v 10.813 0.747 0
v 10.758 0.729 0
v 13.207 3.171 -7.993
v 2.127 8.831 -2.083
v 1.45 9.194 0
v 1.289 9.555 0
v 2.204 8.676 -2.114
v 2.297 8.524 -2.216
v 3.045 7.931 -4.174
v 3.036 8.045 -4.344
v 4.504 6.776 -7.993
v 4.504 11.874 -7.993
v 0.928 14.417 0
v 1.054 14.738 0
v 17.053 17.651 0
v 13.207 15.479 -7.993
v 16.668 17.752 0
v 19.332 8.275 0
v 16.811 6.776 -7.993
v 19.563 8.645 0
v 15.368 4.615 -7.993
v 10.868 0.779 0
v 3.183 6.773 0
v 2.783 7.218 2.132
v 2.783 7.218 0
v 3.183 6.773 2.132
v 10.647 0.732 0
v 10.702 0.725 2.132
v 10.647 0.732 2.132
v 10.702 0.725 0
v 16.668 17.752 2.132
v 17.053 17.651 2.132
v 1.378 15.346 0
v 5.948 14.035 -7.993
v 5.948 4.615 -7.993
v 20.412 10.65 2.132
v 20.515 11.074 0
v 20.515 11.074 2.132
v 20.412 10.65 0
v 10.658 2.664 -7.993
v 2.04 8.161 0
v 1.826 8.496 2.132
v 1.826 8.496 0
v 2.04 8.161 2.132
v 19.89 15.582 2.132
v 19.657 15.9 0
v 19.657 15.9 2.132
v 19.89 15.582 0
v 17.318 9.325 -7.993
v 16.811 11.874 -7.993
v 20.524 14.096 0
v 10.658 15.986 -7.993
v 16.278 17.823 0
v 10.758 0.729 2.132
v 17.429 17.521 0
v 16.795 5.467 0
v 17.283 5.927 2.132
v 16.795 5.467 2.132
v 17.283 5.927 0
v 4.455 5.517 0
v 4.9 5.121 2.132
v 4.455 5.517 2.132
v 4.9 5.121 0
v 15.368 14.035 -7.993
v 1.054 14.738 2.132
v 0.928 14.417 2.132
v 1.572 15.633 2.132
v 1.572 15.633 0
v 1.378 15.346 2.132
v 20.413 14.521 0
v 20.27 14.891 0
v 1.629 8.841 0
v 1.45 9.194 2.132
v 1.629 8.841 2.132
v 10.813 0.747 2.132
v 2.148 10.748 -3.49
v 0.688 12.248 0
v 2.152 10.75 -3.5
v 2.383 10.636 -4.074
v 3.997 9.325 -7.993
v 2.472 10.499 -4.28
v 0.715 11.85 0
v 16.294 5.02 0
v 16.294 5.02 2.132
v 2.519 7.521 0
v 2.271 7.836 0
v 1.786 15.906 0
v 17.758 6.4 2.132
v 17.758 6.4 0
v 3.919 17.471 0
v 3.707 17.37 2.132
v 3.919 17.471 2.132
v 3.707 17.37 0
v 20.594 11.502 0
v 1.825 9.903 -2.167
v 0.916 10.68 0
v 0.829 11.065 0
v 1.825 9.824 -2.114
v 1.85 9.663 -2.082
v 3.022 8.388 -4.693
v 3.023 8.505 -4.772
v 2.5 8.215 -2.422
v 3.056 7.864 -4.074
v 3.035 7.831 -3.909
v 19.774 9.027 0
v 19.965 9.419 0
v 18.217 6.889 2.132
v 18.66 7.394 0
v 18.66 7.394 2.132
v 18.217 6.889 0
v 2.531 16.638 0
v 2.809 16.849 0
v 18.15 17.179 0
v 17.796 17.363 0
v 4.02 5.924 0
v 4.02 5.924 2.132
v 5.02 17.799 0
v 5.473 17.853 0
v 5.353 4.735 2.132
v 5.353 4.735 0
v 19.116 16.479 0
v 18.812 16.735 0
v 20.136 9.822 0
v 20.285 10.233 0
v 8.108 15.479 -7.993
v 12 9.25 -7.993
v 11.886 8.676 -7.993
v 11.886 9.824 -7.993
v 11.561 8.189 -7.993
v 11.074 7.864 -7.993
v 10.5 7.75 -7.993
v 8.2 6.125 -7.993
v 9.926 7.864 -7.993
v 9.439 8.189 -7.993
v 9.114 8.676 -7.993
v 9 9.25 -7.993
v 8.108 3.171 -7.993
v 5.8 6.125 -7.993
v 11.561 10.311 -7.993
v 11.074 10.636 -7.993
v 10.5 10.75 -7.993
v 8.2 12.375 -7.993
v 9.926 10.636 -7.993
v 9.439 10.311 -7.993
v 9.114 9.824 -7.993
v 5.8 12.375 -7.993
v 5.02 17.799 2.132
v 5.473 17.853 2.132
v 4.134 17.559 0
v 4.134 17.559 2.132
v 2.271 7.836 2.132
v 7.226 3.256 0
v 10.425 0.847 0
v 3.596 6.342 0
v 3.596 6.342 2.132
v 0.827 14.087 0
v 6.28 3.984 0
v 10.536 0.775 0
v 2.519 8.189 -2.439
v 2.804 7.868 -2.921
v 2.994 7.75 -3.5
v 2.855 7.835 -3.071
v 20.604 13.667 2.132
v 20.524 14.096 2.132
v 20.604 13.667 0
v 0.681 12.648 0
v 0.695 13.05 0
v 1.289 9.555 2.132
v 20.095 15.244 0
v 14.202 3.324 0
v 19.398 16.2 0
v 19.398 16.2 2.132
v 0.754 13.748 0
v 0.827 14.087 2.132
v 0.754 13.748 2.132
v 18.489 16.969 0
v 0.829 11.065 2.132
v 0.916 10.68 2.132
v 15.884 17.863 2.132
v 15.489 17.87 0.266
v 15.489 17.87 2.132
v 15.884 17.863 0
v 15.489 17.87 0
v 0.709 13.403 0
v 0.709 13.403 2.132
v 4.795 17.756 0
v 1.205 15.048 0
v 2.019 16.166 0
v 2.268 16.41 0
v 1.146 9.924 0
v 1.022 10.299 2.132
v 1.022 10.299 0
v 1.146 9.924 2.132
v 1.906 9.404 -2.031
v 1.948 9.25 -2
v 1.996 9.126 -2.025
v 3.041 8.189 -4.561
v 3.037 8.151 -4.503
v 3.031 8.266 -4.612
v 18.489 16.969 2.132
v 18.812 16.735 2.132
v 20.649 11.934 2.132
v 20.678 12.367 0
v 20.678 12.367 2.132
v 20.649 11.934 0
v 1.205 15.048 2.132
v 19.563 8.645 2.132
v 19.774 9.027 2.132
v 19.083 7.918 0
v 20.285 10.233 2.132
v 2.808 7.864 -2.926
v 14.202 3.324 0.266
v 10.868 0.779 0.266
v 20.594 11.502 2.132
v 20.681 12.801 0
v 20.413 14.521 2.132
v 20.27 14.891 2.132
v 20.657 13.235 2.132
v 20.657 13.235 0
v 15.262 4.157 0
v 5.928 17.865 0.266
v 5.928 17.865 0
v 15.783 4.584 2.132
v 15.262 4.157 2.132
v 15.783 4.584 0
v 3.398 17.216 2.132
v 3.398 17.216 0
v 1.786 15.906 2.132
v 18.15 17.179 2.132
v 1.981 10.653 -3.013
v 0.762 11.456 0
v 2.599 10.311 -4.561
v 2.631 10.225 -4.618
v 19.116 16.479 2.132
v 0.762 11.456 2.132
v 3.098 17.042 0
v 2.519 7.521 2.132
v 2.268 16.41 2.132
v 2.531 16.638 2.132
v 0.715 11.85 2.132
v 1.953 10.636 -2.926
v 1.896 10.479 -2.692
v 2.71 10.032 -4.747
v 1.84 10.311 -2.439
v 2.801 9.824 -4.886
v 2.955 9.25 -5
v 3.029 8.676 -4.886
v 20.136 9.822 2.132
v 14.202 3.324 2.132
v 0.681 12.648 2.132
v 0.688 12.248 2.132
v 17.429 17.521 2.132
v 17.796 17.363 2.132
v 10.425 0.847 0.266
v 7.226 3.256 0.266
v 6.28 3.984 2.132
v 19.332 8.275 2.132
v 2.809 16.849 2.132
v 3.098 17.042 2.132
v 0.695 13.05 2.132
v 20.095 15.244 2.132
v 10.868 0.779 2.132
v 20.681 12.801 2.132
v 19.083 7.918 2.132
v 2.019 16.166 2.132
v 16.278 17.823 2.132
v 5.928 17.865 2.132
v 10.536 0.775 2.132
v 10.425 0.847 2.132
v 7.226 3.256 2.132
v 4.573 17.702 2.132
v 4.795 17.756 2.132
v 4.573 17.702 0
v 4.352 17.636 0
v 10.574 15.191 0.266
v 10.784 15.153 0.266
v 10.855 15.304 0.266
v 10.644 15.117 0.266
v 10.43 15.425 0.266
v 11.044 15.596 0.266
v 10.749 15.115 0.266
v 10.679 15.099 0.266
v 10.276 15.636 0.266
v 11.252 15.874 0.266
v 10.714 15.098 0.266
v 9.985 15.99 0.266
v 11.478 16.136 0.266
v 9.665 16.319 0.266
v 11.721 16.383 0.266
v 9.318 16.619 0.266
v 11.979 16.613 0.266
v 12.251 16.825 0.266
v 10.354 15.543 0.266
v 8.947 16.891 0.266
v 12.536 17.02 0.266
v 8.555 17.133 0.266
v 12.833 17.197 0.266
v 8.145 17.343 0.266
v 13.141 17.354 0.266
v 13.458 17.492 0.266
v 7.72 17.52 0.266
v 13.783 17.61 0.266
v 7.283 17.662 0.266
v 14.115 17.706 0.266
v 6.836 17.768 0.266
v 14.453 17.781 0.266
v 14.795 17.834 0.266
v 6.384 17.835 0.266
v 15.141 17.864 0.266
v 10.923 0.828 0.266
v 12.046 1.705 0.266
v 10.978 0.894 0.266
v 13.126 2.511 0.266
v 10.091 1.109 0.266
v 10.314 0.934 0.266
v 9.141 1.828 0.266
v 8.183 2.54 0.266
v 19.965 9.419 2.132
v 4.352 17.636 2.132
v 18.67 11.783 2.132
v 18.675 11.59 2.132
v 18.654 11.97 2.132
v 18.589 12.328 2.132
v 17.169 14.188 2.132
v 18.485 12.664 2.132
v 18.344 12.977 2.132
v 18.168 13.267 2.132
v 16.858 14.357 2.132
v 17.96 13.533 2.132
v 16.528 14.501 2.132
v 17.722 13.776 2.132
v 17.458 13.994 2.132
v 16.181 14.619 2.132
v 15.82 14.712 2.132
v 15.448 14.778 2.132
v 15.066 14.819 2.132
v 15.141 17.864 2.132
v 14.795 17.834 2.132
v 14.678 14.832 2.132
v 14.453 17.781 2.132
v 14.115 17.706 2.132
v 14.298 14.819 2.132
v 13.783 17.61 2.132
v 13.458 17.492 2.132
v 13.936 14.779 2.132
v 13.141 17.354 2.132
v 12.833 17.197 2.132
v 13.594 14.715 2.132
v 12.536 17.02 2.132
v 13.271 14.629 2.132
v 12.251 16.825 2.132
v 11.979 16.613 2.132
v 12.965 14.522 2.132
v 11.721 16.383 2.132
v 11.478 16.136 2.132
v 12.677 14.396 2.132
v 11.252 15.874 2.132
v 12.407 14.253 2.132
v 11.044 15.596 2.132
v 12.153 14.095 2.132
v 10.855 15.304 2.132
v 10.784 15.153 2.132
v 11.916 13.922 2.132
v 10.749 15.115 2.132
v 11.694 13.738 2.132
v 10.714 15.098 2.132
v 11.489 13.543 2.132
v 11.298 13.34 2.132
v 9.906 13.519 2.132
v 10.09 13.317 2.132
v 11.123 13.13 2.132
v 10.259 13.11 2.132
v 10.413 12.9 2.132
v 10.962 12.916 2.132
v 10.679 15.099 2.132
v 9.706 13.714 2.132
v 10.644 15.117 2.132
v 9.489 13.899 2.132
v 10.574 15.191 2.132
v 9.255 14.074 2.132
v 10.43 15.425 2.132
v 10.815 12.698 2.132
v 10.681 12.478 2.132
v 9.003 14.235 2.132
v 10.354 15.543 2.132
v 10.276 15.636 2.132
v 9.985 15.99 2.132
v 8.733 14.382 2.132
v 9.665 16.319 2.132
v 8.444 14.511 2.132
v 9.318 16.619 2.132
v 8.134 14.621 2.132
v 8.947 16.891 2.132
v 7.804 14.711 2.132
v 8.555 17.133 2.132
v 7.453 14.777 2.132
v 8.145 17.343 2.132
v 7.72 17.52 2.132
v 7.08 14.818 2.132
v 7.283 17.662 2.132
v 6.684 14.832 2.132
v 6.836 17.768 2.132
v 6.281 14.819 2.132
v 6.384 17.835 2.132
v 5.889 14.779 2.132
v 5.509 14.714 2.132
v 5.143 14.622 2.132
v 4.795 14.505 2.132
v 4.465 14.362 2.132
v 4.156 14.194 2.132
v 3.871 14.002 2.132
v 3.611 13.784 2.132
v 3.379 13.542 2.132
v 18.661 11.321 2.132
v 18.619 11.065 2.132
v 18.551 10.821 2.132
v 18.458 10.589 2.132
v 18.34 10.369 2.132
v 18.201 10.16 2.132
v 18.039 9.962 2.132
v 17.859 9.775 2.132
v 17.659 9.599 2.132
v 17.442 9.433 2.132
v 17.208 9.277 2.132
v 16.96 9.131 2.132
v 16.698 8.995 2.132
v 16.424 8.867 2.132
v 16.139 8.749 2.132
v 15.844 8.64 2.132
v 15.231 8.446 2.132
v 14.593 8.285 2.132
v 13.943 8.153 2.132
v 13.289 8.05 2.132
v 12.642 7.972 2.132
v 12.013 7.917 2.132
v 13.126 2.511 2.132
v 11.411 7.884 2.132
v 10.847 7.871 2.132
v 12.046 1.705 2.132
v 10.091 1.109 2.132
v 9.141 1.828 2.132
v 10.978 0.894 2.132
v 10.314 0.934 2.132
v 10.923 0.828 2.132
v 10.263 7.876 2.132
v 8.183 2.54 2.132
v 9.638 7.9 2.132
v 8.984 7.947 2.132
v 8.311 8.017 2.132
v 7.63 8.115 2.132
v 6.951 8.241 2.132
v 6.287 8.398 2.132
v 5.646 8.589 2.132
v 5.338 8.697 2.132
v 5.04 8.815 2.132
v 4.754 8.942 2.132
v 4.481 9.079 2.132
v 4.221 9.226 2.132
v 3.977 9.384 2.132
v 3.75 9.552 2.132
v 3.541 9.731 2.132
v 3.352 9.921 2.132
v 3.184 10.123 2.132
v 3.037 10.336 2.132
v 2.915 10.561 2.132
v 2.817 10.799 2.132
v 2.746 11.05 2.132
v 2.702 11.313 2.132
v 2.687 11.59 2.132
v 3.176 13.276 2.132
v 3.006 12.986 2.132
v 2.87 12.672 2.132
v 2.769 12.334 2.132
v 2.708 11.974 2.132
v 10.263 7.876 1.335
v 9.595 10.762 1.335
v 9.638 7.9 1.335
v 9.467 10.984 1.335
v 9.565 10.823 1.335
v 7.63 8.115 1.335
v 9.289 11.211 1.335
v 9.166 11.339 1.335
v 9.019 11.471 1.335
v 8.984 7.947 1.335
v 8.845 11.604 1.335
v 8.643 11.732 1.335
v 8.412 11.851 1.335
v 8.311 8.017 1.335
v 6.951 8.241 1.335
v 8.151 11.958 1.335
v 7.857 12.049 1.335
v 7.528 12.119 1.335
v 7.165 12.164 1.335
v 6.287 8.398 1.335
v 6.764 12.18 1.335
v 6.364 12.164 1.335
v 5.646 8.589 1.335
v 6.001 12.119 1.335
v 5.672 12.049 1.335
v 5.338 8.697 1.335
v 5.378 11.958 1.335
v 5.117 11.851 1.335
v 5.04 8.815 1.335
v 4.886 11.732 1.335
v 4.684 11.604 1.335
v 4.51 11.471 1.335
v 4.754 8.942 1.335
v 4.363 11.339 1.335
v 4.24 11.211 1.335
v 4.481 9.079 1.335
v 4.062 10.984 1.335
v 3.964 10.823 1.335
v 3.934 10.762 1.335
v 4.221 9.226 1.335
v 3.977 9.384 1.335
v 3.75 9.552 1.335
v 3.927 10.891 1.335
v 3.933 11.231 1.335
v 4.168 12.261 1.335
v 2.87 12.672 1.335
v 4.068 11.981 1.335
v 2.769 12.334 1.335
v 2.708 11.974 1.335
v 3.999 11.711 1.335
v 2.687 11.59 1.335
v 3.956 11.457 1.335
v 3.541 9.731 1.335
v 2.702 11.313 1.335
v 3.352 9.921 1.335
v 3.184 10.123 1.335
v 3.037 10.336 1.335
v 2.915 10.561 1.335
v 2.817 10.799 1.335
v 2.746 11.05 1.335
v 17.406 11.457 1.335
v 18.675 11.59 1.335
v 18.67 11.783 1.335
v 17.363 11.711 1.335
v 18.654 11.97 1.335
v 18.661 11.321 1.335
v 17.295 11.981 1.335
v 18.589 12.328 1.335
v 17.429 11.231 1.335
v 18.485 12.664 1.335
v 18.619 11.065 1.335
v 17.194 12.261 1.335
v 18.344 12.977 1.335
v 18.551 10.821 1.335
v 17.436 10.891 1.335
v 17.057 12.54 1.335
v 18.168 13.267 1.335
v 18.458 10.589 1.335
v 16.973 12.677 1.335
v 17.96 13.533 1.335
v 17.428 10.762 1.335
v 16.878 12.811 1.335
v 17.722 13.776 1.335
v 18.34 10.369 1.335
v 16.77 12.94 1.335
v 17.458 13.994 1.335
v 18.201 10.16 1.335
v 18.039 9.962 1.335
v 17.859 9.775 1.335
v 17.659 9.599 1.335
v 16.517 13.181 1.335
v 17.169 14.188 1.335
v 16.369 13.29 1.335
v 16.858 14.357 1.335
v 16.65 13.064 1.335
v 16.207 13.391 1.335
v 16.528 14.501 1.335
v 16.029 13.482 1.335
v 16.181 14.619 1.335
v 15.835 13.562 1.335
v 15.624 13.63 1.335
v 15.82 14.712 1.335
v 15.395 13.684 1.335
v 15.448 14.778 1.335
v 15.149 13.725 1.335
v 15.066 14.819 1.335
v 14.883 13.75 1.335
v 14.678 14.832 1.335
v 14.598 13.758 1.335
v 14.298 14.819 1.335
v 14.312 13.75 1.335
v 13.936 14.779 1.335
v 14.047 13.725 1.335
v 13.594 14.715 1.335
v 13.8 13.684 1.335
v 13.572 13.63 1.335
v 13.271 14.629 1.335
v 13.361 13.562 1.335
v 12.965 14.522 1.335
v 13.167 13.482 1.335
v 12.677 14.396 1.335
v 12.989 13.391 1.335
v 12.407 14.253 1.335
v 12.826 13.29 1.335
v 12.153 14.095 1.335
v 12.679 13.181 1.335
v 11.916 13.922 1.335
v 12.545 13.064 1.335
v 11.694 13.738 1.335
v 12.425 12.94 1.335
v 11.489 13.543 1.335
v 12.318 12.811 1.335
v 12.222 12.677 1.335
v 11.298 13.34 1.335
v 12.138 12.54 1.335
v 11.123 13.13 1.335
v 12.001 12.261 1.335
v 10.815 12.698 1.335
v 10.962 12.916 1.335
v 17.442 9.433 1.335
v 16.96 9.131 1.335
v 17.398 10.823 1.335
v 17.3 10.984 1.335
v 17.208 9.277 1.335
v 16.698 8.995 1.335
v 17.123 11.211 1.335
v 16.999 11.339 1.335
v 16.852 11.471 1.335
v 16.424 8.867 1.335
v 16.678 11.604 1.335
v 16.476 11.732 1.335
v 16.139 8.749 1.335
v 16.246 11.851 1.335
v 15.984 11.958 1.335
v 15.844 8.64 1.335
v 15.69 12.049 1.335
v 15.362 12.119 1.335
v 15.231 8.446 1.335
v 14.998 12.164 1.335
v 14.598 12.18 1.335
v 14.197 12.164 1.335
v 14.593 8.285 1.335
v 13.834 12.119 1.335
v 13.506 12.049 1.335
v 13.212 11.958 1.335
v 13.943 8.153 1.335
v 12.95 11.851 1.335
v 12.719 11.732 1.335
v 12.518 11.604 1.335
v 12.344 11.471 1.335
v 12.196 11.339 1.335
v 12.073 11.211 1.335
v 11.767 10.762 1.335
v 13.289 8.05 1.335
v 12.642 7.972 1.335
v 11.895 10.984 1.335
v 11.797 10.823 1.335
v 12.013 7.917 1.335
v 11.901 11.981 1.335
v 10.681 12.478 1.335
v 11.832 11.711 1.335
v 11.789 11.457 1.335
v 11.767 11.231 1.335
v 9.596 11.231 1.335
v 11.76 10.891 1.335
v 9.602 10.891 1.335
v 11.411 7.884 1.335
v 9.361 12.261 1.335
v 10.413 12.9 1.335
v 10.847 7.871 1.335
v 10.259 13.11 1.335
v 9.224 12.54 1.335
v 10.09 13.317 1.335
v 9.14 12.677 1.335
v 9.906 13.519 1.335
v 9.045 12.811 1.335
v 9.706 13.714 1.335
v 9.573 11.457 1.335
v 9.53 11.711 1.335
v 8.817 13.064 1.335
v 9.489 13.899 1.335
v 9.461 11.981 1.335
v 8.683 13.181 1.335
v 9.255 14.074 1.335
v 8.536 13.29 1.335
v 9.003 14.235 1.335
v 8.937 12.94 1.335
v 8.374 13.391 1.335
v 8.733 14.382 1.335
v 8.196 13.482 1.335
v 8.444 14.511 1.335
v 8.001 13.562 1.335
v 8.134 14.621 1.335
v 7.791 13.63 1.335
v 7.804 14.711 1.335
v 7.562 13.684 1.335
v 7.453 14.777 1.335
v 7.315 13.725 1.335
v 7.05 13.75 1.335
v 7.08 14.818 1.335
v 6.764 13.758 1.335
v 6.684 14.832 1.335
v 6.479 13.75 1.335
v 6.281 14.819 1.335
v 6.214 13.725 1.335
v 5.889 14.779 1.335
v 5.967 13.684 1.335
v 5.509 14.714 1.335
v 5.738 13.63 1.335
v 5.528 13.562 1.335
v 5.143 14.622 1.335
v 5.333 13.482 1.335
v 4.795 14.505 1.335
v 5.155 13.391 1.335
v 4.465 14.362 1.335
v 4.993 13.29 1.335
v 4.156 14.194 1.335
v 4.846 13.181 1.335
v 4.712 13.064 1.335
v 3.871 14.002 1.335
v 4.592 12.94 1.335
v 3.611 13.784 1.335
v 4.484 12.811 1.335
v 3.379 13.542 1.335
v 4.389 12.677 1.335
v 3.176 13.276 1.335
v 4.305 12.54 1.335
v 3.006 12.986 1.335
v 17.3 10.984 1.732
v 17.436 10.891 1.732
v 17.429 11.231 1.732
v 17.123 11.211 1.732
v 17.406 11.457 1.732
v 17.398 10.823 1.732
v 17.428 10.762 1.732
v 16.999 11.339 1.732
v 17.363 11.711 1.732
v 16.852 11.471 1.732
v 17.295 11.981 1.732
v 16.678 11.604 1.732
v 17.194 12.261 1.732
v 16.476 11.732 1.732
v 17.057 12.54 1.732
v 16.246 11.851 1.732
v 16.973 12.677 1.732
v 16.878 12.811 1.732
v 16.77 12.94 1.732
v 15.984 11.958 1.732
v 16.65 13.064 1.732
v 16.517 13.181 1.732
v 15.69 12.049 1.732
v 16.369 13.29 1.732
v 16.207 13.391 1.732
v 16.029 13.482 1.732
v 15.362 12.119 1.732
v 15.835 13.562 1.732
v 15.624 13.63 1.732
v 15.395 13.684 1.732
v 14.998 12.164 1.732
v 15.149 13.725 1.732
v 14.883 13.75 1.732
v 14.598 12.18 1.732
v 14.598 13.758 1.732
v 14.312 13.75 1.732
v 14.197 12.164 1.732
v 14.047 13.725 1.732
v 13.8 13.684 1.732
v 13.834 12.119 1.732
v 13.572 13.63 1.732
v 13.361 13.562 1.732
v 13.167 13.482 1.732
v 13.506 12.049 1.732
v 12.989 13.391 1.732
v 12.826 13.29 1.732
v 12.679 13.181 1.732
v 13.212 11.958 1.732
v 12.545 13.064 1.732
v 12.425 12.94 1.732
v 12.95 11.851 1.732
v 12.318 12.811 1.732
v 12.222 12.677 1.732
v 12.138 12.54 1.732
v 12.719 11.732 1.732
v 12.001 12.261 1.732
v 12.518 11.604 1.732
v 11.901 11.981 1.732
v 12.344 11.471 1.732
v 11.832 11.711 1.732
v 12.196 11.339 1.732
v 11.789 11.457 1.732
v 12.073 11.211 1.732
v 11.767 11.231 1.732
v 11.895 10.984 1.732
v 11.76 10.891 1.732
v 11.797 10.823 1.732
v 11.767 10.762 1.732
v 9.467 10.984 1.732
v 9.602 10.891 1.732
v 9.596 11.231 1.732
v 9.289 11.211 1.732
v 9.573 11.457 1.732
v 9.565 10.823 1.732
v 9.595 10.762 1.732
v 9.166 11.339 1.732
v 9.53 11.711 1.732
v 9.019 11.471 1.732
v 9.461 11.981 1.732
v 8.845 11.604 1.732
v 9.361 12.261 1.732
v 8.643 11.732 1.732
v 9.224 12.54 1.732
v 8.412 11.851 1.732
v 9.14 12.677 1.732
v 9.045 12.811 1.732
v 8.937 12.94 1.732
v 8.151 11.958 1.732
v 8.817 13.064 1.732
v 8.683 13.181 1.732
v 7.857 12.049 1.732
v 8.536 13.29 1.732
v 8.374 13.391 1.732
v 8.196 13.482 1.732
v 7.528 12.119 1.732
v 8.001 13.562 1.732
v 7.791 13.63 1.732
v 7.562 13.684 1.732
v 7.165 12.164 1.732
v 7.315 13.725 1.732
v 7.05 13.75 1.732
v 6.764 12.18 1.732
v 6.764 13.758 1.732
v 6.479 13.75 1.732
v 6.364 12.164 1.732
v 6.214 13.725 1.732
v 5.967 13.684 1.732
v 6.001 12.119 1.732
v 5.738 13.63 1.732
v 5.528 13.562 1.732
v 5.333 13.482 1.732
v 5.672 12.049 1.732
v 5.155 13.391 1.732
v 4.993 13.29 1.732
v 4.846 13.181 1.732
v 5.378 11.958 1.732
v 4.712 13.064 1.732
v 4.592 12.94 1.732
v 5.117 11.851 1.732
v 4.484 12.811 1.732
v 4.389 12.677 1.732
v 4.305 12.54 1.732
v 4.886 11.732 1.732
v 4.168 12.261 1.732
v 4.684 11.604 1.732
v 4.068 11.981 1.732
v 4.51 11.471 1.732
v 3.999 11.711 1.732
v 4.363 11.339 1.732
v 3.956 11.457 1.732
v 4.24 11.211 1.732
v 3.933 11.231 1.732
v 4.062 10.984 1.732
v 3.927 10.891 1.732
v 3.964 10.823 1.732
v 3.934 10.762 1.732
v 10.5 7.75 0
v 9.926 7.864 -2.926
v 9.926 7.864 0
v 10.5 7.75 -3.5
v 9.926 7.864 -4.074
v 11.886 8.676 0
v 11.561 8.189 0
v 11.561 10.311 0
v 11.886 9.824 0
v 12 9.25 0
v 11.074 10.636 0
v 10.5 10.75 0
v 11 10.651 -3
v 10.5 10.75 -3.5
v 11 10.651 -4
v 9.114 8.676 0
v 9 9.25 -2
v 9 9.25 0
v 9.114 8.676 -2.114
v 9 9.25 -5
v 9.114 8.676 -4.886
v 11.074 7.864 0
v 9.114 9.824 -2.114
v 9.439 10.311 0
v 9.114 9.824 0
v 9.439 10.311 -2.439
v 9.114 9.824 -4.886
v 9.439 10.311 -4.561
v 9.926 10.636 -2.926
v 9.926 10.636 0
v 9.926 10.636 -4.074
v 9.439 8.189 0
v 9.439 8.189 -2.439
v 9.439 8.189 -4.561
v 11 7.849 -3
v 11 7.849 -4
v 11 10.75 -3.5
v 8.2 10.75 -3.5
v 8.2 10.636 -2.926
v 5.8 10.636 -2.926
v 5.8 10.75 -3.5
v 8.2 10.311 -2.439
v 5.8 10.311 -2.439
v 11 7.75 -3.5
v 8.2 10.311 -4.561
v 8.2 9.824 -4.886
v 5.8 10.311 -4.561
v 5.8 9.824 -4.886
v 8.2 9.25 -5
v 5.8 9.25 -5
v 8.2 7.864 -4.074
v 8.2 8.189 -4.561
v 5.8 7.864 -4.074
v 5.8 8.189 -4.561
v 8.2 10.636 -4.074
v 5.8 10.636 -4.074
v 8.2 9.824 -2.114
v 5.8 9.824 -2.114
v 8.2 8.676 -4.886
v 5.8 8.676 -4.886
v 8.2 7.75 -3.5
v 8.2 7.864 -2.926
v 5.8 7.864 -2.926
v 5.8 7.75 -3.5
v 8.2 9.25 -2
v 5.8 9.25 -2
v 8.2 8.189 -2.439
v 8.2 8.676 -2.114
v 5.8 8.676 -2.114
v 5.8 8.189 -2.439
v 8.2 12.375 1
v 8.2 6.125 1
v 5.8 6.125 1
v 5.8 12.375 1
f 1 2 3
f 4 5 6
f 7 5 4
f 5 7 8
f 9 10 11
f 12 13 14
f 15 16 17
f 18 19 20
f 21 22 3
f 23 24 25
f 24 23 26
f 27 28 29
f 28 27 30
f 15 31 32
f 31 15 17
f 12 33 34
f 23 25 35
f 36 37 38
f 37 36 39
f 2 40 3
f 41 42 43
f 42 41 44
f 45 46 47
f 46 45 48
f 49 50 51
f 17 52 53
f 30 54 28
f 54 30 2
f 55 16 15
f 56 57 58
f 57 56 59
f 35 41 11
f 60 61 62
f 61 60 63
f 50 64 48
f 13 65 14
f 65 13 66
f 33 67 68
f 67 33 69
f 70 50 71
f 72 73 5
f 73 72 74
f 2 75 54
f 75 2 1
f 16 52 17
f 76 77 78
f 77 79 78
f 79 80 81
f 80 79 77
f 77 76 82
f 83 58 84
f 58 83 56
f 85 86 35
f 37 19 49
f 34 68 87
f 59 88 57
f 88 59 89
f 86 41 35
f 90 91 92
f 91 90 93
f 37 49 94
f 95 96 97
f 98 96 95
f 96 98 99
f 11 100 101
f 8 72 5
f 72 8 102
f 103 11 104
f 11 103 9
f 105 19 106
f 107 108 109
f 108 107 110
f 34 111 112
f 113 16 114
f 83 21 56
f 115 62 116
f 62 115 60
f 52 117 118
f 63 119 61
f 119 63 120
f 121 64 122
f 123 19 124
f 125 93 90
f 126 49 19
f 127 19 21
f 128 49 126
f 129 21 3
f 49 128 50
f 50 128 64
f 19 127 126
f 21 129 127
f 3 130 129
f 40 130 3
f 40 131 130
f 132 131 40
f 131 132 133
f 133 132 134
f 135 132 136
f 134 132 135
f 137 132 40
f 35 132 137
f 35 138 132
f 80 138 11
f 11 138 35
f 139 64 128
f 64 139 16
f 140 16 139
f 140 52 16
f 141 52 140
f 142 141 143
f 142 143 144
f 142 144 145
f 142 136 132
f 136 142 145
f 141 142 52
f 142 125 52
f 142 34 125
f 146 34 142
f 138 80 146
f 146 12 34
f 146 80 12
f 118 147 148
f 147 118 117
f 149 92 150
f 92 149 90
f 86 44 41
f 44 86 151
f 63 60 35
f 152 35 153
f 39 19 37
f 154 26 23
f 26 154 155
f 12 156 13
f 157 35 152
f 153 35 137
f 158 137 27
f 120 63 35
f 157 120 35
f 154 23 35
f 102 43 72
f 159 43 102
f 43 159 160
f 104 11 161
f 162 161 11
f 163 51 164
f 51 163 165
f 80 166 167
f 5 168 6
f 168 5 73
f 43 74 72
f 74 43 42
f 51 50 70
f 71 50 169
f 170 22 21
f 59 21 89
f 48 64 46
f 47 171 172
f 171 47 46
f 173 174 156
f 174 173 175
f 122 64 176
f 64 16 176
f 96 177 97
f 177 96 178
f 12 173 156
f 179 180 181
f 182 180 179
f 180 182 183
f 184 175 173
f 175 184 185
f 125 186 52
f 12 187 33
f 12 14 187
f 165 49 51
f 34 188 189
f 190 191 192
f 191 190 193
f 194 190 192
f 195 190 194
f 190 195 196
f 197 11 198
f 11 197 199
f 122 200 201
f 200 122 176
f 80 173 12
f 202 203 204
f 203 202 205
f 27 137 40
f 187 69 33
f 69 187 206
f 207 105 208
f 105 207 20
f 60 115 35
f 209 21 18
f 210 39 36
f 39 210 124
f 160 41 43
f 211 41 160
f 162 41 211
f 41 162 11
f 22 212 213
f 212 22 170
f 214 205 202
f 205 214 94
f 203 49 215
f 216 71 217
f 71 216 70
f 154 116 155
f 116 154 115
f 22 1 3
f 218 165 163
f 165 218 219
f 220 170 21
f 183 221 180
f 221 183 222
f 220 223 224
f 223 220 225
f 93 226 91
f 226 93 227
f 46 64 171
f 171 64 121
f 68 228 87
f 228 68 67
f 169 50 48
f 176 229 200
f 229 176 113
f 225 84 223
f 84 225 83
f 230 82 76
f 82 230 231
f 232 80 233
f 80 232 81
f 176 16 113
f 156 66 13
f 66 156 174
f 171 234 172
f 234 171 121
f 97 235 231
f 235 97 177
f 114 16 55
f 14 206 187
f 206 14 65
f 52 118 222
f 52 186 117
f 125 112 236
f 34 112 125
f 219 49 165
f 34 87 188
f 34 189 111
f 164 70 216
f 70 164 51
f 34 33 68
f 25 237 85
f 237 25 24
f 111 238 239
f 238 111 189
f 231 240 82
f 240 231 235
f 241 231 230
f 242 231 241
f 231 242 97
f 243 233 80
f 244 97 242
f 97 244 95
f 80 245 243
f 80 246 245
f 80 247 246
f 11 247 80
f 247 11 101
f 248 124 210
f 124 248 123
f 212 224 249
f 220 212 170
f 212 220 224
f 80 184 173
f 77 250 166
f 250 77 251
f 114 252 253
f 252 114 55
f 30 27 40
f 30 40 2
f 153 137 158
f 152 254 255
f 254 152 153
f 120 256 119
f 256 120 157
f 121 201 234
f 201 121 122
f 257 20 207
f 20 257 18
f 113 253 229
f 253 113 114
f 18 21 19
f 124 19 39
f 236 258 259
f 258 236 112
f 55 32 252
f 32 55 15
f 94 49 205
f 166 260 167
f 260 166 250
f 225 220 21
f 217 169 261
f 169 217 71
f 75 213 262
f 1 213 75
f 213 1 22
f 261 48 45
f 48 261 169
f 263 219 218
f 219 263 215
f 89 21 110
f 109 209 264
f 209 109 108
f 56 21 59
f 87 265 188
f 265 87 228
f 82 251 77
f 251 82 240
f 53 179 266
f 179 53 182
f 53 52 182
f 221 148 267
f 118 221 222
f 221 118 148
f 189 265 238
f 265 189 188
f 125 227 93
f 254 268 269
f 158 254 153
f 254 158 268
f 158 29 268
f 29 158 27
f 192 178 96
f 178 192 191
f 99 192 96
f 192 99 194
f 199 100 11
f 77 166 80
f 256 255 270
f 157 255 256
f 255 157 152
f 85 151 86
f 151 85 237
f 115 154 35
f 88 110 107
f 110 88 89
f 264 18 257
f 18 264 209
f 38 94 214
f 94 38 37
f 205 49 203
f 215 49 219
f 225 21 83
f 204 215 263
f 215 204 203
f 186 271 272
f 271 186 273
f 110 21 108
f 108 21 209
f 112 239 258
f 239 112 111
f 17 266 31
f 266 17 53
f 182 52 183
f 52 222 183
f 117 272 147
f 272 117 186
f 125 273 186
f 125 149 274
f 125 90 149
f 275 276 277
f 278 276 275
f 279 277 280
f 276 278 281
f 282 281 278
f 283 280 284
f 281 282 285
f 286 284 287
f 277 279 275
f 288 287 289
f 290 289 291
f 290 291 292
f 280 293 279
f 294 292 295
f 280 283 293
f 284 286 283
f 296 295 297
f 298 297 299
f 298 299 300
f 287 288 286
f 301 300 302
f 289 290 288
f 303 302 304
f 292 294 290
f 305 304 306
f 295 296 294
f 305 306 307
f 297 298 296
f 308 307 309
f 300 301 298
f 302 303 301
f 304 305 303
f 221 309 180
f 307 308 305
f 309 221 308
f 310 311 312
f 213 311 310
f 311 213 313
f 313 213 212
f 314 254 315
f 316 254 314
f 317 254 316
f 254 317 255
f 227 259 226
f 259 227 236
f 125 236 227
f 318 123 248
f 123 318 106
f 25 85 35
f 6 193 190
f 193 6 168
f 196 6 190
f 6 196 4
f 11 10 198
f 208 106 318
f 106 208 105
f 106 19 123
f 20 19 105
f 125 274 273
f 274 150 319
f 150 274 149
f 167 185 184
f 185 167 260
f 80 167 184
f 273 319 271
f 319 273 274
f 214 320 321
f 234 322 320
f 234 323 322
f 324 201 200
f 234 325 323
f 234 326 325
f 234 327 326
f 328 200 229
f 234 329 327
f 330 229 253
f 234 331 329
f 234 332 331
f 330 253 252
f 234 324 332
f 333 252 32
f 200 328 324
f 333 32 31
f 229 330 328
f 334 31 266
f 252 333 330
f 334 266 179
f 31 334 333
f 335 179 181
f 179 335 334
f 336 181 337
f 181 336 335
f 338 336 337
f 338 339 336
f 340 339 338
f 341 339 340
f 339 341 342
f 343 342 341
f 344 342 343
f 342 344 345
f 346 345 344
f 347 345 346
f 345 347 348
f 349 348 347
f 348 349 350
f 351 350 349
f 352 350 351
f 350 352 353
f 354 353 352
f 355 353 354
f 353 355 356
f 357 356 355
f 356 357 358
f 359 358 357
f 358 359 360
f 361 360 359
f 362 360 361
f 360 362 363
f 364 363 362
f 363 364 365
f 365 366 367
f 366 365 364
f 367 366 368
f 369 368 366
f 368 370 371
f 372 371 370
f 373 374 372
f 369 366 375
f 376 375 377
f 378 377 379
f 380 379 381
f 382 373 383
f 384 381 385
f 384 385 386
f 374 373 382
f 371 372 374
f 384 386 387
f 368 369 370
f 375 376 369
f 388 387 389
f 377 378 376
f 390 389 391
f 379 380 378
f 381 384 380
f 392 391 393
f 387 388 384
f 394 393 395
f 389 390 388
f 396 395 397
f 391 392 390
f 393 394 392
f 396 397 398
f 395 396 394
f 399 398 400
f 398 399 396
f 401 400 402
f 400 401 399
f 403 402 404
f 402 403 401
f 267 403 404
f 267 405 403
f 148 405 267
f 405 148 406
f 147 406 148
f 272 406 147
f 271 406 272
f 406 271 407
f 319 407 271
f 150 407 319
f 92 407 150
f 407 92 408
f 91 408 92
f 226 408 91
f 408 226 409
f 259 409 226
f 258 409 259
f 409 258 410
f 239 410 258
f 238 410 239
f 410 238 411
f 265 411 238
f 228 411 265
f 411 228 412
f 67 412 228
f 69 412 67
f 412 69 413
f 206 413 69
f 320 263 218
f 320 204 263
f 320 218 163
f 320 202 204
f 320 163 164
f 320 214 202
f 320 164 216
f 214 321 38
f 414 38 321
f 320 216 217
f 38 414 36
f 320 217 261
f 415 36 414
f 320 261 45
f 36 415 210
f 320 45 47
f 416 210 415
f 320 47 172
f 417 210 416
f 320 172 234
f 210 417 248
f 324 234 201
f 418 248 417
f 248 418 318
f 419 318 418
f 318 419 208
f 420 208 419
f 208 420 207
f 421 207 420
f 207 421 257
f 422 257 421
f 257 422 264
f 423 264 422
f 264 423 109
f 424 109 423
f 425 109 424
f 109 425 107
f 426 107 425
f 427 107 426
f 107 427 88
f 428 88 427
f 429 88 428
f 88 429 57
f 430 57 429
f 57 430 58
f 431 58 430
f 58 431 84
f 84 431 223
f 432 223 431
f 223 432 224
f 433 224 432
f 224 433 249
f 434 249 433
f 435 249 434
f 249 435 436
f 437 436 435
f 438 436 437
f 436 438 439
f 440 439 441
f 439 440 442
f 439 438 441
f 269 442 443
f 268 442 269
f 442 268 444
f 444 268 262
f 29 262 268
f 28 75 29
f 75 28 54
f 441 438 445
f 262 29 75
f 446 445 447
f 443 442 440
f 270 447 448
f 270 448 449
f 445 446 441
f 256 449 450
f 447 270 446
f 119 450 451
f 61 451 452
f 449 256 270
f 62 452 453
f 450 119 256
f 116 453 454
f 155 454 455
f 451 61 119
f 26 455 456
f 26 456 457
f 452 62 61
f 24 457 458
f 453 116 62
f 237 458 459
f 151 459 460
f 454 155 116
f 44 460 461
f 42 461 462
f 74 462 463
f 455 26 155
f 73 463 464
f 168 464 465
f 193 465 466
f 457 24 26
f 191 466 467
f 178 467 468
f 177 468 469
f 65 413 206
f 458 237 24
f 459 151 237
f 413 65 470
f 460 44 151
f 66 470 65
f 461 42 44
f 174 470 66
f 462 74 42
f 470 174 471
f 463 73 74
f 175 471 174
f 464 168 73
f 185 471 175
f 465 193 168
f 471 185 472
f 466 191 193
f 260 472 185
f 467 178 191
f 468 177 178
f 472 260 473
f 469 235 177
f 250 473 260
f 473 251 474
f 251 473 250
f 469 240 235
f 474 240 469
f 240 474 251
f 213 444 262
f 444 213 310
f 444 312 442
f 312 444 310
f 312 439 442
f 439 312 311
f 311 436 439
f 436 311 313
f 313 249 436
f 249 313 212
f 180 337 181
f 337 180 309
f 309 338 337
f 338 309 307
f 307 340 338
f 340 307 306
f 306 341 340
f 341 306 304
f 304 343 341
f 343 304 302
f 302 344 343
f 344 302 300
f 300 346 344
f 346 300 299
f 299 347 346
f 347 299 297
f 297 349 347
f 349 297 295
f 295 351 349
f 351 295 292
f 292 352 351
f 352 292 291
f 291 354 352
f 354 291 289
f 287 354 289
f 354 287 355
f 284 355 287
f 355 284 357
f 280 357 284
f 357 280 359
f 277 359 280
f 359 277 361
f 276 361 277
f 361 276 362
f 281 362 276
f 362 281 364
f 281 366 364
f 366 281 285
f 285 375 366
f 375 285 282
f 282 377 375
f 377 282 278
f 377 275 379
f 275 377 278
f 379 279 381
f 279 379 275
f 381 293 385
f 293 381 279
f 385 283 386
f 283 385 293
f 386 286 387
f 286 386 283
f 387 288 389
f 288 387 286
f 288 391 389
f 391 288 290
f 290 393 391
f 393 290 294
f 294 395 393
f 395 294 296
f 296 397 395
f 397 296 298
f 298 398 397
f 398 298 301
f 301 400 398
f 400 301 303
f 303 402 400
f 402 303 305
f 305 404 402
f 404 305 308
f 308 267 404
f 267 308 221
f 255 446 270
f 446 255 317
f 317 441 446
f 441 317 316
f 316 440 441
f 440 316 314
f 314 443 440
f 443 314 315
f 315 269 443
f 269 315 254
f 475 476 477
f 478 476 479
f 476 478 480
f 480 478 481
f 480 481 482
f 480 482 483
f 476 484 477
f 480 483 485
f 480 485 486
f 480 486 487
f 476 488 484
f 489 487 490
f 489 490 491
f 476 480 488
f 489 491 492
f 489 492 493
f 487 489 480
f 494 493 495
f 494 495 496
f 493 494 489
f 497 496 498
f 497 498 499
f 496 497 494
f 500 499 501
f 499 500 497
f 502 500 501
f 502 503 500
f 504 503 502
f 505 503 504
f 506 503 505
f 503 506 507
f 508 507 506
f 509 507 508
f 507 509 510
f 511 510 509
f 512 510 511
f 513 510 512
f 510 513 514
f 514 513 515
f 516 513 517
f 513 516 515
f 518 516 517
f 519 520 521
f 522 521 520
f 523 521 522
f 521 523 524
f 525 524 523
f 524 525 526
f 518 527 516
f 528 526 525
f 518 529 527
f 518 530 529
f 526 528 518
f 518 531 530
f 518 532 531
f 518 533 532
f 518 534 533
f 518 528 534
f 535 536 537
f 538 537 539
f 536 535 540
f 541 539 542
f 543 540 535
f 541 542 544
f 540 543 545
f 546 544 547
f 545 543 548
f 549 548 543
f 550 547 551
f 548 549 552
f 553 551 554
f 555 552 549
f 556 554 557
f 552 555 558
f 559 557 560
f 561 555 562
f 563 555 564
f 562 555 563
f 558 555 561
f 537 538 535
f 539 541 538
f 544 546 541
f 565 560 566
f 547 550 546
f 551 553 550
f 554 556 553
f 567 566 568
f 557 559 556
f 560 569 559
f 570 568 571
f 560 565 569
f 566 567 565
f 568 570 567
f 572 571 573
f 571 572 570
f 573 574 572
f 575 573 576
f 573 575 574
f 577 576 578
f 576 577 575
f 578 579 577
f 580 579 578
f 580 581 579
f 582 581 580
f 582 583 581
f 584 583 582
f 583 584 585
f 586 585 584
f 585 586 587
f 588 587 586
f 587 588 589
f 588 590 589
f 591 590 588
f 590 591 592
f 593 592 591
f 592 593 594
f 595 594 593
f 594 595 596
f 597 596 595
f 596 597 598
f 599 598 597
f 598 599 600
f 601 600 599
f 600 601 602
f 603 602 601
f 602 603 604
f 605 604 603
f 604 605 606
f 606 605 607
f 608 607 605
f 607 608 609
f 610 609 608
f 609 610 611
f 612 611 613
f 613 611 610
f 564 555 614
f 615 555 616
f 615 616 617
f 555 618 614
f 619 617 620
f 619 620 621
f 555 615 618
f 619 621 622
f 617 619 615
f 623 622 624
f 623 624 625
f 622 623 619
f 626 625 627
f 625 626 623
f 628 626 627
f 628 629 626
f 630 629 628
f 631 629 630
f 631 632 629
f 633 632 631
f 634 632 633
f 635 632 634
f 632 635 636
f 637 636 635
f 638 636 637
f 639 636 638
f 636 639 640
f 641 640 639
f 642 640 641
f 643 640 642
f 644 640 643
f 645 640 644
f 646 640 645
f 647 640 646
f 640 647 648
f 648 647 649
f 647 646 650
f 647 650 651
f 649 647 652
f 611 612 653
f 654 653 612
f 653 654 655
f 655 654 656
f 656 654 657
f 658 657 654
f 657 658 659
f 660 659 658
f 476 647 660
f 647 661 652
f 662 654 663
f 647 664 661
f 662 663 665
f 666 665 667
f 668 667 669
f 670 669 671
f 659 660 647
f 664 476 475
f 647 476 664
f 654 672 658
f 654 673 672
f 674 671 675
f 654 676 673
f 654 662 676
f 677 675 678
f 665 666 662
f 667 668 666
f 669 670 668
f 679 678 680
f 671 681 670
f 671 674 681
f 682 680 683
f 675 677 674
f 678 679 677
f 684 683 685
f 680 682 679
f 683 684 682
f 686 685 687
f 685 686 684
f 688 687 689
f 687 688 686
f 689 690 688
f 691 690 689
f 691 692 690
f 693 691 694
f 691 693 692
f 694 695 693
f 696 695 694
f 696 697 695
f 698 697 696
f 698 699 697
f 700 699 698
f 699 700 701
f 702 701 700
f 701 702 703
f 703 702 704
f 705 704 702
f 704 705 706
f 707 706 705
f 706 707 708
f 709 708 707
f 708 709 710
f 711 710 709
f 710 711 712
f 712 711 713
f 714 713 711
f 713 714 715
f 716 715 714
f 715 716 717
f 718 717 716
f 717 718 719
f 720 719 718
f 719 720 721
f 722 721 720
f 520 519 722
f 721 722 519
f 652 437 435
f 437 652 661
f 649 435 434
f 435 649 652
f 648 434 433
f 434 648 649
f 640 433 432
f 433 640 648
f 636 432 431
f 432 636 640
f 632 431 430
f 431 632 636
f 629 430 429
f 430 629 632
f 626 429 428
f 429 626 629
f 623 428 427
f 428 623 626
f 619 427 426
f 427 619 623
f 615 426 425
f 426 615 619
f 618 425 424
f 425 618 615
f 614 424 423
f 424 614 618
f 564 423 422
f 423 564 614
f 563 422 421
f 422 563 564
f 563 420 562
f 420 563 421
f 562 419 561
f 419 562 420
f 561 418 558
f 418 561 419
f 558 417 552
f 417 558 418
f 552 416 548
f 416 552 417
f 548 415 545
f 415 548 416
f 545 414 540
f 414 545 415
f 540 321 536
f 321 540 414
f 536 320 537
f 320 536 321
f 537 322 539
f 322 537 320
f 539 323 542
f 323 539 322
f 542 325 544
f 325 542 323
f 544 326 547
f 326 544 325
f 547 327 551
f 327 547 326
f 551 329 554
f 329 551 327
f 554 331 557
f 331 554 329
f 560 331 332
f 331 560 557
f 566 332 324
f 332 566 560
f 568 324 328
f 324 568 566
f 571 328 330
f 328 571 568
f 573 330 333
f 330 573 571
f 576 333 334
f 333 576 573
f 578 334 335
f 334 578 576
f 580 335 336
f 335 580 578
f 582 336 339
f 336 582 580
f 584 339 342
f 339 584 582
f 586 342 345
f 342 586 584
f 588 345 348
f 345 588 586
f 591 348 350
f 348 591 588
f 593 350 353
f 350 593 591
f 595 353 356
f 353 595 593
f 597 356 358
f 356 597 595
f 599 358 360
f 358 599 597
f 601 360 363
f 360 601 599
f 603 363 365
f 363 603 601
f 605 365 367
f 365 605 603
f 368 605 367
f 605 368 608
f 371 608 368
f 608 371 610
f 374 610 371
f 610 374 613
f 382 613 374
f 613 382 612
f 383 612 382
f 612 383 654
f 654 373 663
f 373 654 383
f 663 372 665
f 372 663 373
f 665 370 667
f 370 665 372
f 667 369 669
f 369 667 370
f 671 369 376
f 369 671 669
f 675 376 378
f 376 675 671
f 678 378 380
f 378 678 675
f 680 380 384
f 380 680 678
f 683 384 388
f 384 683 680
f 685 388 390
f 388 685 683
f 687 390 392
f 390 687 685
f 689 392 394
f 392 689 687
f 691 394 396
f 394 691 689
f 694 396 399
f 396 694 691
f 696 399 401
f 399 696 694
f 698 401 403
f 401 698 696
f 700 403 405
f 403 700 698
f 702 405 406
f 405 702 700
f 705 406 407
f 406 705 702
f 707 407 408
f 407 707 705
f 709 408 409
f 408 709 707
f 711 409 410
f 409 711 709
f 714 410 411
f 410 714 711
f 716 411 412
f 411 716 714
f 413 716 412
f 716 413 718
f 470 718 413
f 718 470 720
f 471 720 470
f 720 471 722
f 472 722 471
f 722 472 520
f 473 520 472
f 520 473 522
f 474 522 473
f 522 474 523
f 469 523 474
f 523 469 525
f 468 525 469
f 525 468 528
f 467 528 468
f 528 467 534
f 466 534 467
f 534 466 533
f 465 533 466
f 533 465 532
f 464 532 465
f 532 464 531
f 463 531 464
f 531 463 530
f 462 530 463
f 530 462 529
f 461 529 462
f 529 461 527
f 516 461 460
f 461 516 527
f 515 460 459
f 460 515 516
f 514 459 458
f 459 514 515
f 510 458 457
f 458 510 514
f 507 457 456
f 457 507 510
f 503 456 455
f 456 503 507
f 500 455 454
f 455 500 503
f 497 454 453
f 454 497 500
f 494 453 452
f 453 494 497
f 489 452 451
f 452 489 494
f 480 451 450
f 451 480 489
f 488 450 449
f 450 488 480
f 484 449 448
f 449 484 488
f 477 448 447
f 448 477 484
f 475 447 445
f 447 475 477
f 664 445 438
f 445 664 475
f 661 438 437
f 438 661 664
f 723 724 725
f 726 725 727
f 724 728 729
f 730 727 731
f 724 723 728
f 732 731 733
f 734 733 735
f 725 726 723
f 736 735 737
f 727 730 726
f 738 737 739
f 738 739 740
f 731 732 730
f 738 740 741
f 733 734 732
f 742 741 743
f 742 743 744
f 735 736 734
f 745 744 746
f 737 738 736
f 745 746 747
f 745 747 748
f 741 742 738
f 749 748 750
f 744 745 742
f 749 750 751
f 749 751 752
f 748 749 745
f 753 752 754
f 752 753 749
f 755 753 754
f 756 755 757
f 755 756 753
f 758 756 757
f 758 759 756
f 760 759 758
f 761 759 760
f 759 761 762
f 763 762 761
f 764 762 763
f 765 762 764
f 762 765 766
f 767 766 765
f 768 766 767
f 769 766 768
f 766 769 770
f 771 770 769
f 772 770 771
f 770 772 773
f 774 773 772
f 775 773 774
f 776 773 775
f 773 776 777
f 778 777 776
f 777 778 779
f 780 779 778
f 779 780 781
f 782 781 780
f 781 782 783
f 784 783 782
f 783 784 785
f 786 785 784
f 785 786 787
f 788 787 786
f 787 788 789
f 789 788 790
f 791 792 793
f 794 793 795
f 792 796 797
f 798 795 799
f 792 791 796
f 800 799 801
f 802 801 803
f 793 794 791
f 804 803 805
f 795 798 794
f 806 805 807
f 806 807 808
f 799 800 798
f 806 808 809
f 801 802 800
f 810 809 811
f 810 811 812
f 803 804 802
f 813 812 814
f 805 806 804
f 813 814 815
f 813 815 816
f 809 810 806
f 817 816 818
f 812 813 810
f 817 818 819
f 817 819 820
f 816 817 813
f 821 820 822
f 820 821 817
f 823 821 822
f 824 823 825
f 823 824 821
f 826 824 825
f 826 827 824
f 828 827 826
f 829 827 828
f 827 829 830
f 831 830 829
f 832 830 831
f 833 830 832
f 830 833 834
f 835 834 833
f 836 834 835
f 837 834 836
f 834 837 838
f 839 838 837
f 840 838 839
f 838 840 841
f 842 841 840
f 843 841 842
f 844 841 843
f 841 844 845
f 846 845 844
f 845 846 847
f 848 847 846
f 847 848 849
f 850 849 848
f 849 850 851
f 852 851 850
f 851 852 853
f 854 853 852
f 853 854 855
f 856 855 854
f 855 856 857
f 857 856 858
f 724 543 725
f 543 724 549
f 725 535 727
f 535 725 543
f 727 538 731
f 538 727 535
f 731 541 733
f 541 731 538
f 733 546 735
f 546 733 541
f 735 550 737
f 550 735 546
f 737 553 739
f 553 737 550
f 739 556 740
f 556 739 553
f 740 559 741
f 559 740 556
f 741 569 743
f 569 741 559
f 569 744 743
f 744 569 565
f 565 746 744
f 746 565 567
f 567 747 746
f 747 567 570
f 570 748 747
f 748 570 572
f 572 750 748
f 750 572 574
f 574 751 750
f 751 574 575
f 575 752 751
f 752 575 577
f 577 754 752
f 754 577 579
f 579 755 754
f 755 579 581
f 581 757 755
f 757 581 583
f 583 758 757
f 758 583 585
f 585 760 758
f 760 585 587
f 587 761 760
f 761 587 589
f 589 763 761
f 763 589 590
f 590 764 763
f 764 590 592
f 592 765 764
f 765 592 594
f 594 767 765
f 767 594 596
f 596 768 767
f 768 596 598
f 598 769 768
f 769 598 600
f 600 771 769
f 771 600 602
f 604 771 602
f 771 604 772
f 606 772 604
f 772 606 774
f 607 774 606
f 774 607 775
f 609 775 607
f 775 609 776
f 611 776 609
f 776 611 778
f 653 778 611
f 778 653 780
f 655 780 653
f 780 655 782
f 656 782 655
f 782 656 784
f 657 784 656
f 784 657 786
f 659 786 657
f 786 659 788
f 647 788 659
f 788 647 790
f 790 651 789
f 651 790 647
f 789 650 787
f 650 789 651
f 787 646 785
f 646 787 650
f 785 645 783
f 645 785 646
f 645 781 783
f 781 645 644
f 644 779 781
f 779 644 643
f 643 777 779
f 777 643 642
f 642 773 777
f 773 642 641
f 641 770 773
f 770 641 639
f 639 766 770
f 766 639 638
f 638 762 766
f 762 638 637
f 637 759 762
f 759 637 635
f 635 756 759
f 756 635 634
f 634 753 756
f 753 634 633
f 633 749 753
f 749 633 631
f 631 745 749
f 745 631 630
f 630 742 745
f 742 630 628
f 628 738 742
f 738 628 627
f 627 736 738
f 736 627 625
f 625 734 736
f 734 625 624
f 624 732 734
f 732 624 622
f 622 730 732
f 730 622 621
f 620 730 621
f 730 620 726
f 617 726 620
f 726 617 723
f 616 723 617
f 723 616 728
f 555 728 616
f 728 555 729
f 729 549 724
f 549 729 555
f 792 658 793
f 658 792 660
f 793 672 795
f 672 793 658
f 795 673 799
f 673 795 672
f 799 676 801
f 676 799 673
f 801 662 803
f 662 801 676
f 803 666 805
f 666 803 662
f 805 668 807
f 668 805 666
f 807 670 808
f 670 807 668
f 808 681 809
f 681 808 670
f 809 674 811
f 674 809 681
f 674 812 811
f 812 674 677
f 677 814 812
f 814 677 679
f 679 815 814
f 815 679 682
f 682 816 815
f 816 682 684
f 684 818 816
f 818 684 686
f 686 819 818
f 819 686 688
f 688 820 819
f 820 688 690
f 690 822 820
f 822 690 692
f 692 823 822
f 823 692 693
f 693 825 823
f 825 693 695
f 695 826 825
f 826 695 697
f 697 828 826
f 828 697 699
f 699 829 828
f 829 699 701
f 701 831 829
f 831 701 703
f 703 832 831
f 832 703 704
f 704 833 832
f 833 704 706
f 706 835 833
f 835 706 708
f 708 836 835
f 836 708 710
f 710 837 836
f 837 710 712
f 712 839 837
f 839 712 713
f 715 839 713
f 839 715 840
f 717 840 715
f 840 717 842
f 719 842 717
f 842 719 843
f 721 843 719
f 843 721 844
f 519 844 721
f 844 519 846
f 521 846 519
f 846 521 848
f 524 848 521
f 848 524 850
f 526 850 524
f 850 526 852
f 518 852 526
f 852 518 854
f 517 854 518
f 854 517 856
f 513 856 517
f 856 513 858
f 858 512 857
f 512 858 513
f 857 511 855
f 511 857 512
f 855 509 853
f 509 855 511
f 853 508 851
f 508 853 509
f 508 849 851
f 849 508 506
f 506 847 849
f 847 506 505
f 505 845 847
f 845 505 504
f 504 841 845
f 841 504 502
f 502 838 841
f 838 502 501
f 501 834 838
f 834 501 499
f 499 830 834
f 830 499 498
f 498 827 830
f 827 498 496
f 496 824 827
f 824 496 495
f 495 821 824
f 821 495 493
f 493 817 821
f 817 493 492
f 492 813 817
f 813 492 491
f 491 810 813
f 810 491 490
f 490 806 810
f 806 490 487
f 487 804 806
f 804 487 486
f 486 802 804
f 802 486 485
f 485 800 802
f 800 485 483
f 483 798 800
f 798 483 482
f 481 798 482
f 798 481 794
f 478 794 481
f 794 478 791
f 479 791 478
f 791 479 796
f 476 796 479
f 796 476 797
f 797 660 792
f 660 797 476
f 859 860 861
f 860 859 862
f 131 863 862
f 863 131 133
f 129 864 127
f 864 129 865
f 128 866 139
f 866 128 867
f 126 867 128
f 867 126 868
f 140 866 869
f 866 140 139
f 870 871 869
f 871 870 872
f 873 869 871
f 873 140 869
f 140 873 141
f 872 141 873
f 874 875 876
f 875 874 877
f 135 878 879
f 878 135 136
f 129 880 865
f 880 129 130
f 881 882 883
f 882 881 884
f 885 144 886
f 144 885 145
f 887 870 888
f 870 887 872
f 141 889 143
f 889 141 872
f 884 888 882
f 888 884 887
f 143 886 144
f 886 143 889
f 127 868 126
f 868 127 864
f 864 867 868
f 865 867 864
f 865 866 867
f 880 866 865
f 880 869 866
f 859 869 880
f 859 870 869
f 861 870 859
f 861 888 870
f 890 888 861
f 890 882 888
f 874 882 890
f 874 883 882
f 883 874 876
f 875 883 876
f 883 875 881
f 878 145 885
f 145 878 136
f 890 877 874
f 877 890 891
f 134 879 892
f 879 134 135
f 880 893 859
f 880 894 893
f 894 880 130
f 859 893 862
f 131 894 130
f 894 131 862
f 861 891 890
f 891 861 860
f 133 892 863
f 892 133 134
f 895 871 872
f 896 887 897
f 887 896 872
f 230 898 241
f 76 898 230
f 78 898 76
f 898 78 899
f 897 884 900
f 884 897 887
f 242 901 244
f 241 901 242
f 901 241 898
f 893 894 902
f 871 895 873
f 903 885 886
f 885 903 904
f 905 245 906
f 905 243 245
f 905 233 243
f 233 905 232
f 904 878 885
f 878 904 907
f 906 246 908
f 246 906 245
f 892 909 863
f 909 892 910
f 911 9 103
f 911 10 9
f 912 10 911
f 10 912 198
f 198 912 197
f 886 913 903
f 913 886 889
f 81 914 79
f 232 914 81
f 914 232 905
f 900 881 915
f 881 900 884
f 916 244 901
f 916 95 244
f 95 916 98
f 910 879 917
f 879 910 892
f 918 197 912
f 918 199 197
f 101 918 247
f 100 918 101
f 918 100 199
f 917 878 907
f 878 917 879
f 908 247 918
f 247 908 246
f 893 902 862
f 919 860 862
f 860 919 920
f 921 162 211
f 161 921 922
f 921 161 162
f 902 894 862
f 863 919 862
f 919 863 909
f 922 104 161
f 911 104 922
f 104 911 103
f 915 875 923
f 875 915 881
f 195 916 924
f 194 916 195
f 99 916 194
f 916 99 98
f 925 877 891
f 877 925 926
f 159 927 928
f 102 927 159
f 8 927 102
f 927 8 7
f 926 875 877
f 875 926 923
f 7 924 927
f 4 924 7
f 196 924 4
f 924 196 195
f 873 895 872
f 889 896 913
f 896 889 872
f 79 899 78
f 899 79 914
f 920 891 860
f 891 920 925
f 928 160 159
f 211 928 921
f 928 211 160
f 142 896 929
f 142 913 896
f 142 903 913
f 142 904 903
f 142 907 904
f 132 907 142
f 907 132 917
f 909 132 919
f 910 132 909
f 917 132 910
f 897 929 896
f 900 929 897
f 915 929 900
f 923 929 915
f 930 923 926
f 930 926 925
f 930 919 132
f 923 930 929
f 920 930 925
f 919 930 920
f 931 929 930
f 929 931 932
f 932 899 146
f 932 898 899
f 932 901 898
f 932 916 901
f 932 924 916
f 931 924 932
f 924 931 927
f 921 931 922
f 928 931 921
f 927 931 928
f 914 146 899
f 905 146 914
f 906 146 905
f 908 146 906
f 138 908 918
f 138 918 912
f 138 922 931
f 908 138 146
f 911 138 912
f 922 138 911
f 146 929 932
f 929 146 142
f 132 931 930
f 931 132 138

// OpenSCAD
//!OpenSCAD

pad = 0.01;
base_h = 8;
feature_h = 3;
cut_base_h = 3;
cut_h = 25;
cut_w = 75;
w = cut_w + 10;

smooth = 16;
$fn = smooth;

difference(){
resize(newsize=[20,0,0], auto=true)
union(){
    difference(){
        union()
        {
            hull()
            {
            linear_extrude(height=1)
            import(file="EveHeartFace.dxf", layer="Heart", center=true);

            translate([40,35,-15])
            cylinder(h=30, r=25, center=true);
            }

        linear_extrude(height=base_h)
        import(file="EveHeartFace.dxf", layer="Heart", center=true);
        }

    translate([0,0,base_h - feature_h + pad])
    linear_extrude(height=feature_h)
    import(file="EveHeartFace.dxf", layer="Face", center=true);
    }

translate([0,0,base_h - feature_h])
linear_extrude(height=feature_h/2)
import(file="EveHeartFace.dxf", layer="Eyes", center=true);
}

#translate([10.5,9.25,-5])
cylinder(h=10, r=1.5, center=true);

#translate([5,9.25,-3.5])
rotate([90,0,90])
cylinder(h=12, r=1.5, center=true);

#translate([7,9.25,-4])
cube([2.4, 6.25, 10], center=true);
}
